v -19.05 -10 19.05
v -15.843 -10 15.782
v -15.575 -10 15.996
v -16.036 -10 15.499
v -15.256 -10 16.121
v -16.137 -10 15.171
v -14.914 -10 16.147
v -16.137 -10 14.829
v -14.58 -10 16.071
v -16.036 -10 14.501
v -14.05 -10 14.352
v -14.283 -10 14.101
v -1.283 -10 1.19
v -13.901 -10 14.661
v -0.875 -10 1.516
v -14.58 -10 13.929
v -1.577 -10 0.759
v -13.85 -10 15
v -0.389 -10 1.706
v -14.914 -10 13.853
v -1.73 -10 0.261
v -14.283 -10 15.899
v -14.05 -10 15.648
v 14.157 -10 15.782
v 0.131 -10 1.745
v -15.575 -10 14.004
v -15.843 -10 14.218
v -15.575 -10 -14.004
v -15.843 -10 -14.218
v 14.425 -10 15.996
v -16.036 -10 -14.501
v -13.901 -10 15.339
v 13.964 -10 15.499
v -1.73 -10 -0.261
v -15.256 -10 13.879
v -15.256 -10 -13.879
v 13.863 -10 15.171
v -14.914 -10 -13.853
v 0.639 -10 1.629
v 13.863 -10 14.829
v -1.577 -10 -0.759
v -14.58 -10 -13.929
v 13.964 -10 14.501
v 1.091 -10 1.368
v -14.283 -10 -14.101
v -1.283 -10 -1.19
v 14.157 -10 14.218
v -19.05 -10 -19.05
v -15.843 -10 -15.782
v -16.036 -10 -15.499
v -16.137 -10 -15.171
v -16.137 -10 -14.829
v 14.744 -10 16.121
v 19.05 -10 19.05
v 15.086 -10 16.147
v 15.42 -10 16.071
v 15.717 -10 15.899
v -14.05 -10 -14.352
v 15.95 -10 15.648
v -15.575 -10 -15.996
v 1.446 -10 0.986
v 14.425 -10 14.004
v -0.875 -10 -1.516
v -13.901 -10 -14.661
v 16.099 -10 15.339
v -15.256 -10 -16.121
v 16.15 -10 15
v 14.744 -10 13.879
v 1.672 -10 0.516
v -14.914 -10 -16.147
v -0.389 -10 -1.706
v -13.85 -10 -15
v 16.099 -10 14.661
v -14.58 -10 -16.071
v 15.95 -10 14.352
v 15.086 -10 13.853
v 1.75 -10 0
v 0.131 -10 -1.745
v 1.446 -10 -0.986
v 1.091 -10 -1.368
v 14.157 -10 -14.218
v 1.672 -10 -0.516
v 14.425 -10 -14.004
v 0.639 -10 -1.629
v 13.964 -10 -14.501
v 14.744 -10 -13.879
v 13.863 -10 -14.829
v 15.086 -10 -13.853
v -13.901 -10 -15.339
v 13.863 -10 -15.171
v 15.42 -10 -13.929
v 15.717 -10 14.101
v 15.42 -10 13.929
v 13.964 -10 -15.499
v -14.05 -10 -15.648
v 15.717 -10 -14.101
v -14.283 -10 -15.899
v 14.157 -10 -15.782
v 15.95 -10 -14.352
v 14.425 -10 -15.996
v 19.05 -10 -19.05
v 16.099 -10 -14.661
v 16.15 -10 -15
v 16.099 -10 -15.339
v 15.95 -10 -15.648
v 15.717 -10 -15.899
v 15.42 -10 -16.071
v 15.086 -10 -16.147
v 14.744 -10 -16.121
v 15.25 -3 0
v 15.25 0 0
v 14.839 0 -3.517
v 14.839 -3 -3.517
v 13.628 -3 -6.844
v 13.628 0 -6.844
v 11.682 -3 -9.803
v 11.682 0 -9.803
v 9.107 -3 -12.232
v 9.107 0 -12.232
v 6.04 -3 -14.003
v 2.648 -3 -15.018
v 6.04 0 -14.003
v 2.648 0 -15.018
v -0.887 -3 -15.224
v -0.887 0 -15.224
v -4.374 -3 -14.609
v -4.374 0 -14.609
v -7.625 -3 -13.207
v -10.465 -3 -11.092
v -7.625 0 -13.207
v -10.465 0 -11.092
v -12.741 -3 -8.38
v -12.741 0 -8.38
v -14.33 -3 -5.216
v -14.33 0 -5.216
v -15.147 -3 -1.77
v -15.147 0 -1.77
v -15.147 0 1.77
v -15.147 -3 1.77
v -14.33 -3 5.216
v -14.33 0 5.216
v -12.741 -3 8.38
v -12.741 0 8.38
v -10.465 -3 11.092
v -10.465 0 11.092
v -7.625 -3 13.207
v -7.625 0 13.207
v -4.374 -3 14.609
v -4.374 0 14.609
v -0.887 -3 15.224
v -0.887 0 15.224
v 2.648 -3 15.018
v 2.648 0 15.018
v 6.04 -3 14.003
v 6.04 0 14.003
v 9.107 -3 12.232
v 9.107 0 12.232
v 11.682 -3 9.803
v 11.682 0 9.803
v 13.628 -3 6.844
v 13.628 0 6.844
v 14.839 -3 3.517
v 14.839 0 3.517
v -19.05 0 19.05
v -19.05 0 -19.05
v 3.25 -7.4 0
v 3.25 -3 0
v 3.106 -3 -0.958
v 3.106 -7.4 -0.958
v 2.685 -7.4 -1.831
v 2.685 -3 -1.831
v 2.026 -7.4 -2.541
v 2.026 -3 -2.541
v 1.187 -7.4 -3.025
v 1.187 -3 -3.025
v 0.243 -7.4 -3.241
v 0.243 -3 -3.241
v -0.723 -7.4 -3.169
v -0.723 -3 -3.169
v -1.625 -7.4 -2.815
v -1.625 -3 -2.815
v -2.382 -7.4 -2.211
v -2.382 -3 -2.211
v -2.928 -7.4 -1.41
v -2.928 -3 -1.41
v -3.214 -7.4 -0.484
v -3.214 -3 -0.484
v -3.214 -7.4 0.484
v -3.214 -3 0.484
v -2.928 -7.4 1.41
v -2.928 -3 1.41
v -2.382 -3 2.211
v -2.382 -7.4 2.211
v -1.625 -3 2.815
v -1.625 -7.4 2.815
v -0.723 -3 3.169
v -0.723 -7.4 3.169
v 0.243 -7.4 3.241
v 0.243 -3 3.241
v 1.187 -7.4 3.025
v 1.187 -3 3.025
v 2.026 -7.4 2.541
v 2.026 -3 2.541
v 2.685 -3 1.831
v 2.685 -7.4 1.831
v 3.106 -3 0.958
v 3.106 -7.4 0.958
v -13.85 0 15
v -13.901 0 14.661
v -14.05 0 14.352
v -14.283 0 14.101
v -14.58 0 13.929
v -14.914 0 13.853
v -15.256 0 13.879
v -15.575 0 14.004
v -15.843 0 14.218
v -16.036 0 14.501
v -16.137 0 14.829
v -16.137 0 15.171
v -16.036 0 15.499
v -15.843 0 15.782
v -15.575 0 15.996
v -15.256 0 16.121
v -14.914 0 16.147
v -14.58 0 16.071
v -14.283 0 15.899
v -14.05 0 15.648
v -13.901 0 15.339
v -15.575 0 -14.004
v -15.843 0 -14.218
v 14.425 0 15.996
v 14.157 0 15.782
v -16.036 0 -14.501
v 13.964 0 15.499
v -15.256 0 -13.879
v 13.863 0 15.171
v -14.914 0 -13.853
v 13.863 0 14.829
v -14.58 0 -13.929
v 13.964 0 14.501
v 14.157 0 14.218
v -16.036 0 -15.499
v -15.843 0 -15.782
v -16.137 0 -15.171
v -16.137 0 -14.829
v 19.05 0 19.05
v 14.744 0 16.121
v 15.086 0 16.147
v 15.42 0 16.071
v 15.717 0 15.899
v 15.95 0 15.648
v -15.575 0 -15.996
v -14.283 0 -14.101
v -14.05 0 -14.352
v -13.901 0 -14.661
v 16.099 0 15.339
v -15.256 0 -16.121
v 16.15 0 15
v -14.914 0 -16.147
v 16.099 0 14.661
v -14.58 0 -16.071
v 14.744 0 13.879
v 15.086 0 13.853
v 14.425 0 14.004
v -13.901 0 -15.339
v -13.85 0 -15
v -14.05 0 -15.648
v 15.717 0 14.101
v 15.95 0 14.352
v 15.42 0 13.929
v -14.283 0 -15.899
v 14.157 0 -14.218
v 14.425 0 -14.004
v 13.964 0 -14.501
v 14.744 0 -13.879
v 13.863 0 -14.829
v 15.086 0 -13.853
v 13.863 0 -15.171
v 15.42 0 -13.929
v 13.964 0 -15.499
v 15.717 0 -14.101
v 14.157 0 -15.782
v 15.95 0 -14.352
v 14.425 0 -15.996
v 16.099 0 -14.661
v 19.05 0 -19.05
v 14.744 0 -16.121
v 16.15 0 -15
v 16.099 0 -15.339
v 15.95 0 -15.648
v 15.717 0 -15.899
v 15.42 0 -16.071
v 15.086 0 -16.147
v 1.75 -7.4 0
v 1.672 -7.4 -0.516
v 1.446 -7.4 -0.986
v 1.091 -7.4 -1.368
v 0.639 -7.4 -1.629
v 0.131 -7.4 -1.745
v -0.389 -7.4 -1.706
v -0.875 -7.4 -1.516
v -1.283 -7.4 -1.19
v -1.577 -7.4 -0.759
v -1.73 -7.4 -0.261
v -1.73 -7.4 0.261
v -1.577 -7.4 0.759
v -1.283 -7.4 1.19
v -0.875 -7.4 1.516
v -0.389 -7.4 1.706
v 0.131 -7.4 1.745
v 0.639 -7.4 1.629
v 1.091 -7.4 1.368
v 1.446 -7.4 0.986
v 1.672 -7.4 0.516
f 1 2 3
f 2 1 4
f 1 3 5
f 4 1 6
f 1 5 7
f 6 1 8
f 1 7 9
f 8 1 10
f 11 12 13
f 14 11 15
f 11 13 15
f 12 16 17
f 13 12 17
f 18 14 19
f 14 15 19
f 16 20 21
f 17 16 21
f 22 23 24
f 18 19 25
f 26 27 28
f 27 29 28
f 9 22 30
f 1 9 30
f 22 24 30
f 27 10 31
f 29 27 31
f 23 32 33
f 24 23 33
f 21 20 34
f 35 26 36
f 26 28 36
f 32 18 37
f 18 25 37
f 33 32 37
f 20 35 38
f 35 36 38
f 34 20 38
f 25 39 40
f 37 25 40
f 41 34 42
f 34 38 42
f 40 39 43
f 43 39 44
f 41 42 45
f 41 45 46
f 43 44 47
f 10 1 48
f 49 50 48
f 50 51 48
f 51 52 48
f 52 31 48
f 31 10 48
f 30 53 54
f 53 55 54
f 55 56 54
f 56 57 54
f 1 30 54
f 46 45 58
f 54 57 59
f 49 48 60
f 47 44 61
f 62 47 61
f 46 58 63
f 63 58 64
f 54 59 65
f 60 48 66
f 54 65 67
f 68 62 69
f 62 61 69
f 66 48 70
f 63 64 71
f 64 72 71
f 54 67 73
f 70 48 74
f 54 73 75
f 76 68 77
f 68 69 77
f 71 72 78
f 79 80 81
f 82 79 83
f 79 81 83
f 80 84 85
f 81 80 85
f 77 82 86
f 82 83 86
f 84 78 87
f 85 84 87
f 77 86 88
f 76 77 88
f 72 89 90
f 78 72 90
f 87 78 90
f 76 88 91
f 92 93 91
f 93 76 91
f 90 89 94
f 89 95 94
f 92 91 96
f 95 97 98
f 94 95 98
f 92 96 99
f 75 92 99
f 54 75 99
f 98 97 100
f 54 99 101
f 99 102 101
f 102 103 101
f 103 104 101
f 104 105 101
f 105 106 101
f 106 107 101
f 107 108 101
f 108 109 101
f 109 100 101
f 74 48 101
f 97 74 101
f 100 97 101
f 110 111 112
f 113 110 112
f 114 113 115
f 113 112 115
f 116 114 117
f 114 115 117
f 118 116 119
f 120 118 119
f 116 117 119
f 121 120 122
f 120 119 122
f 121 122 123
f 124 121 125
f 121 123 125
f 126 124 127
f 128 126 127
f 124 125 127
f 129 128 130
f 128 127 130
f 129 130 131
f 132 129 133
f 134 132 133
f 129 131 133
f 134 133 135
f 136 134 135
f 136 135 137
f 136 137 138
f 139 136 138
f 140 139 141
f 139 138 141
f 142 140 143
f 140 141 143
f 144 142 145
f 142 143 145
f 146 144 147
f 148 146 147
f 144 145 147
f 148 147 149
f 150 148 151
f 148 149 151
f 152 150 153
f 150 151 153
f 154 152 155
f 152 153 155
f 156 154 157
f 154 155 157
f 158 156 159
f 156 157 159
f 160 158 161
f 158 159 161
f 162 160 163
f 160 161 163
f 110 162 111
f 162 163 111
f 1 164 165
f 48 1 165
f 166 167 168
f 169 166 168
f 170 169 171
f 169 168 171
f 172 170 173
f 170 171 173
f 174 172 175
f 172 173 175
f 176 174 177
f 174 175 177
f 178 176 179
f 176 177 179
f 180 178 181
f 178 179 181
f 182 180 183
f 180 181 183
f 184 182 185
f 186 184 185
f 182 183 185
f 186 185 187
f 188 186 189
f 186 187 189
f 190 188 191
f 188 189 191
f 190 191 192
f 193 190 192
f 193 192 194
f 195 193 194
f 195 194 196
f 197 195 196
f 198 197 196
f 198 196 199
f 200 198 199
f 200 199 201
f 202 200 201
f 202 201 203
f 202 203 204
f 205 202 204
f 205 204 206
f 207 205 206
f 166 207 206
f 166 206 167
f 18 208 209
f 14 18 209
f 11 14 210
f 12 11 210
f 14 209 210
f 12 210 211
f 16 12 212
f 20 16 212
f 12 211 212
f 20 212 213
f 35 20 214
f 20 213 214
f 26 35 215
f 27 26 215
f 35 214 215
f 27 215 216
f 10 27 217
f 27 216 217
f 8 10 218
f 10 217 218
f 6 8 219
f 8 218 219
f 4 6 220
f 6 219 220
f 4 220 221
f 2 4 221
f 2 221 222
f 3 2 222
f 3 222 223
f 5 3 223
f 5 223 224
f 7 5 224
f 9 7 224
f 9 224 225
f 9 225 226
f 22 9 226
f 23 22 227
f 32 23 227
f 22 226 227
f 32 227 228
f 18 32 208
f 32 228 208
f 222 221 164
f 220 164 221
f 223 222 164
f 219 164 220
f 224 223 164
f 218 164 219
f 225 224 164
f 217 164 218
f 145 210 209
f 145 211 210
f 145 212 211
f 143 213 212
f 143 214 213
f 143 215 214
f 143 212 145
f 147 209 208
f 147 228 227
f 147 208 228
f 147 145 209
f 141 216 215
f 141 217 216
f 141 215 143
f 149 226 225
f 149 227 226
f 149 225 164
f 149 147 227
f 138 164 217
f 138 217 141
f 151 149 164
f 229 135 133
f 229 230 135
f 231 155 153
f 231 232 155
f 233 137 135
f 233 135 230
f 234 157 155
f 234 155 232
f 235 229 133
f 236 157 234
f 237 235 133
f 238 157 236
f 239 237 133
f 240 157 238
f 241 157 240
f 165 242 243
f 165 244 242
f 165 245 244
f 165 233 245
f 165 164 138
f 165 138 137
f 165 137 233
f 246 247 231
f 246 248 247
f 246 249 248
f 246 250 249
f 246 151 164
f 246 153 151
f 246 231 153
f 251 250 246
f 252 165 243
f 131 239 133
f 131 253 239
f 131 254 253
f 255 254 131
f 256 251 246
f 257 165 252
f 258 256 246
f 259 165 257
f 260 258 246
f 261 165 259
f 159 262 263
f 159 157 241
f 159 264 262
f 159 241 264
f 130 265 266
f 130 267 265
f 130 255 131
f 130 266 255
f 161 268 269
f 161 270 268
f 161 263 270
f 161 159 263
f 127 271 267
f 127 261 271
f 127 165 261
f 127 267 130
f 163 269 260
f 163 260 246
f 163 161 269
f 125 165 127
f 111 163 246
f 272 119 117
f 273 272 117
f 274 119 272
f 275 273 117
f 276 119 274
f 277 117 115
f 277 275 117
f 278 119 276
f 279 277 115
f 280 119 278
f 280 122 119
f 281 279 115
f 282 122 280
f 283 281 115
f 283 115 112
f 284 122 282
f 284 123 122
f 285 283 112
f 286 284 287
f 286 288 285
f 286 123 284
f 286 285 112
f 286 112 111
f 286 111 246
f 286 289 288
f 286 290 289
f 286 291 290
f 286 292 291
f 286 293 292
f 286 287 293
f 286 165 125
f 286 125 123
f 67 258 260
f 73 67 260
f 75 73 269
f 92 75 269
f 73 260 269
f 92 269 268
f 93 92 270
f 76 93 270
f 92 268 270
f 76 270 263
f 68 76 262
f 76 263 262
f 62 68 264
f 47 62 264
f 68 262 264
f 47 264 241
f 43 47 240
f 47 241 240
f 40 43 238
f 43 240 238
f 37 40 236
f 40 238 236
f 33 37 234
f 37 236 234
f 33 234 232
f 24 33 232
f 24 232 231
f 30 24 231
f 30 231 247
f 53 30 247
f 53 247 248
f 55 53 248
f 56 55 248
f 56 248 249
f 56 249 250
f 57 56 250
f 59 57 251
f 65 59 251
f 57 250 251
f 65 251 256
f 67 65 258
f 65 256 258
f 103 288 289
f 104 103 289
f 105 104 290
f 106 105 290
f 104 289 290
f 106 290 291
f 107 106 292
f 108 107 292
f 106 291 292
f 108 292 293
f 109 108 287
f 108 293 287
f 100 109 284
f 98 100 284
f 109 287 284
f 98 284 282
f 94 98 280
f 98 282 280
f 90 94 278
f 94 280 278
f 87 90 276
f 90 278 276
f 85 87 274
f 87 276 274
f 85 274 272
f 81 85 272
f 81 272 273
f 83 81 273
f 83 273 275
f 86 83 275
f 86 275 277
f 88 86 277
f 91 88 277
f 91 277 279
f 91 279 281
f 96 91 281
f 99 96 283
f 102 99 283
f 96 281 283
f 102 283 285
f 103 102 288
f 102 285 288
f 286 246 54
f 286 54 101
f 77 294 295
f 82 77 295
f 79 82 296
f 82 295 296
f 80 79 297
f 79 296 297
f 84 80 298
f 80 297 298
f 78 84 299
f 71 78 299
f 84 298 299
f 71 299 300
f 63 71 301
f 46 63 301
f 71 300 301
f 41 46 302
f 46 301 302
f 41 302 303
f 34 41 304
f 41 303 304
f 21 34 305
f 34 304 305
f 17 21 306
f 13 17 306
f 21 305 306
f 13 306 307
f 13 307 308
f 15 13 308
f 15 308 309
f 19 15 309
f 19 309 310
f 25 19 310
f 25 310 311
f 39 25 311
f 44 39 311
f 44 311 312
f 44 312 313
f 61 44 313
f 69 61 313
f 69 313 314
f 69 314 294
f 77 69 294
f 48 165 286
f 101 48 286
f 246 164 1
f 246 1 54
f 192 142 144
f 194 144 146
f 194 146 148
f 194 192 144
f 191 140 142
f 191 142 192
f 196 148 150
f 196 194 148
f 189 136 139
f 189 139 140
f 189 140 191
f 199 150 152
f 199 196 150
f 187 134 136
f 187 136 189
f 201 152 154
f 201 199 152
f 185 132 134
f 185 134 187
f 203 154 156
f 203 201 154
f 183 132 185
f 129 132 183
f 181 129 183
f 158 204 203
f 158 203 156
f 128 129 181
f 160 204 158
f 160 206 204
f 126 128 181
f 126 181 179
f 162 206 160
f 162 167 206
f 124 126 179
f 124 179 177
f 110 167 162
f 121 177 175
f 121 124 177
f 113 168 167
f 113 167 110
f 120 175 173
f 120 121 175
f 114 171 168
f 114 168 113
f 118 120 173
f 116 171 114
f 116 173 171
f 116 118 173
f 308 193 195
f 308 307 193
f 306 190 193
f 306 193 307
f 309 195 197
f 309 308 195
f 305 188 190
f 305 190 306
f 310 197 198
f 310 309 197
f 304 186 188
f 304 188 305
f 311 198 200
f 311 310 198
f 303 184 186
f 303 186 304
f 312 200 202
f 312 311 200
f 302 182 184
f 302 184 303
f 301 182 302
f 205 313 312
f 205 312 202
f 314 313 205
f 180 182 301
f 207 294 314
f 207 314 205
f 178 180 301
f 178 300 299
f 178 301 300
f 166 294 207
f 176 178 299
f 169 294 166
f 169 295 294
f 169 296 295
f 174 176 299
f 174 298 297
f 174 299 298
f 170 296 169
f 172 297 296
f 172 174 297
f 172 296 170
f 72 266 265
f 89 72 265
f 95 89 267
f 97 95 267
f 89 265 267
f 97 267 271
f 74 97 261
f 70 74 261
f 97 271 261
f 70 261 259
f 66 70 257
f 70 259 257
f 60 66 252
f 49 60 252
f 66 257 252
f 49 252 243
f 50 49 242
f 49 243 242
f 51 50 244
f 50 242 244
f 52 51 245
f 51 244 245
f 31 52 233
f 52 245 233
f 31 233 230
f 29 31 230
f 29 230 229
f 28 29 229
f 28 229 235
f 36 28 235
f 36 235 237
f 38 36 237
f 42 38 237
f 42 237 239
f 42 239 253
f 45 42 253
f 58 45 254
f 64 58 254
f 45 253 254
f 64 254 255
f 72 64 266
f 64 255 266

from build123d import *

# Parameters (mm, degrees)
SKETCH1_W           = 38.1
SKETCH1_H           = 38.1
BOSS_EXTRUDE1_DEPTH = 10
SKETCH1_3_R         = 1.15
CUT_EXTRUDE1_DEPTH  = 10
SKETCH1_4_R         = 1.15
CUT_EXTRUDE2_DEPTH  = 10
SKETCH1_5_R         = 1.15
CUT_EXTRUDE3_DEPTH  = 10
SKETCH1_6_R         = 1.15
CUT_EXTRUDE4_DEPTH  = 10
SKETCH1_7_R         = 15.25
SKETCH1_7_R_2       = 3.25
CUT_EXTRUDE5_DEPTH  = 3
SKETCH1_8_R         = 3.25
SKETCH1_8_R_2       = 1.75
CUT_EXTRUDE6_DEPTH  = 7.4
SKETCH1_9_R         = 1.75
CUT_EXTRUDE7_DEPTH  = 10


with BuildPart() as part:
    # Sketch1 → Boss-Extrude1 (new body)
    with BuildSketch(Plane(origin=(0, 0, 0), x_dir=(1, 0, 0), z_dir=(0, 1, 0))):
        Rectangle(SKETCH1_W, SKETCH1_H)
    extrude(amount=-BOSS_EXTRUDE1_DEPTH)

    # Sketch1<3> → Cut-Extrude1 (cut)
    with BuildSketch(Plane(origin=(0, 0, 0), x_dir=(1, 0, 0), z_dir=(0, 1, 0))):
        with Locations((-15, 15)):
            Circle(SKETCH1_3_R)
    extrude(amount=-CUT_EXTRUDE1_DEPTH, mode=Mode.SUBTRACT)

    # Sketch1<4> → Cut-Extrude2 (cut)
    with BuildSketch(Plane(origin=(0, 0, 0), x_dir=(1, 0, 0), z_dir=(0, 1, 0))):
        with Locations((15, 15)):
            Circle(SKETCH1_4_R)
    extrude(amount=-CUT_EXTRUDE2_DEPTH, mode=Mode.SUBTRACT)

    # Sketch1<5> → Cut-Extrude3 (cut)
    with BuildSketch(Plane(origin=(0, 0, 0), x_dir=(1, 0, 0), z_dir=(0, 1, 0))):
        with Locations((-15, -15)):
            Circle(SKETCH1_5_R)
    extrude(amount=-CUT_EXTRUDE3_DEPTH, mode=Mode.SUBTRACT)

    # Sketch1<6> → Cut-Extrude4 (cut)
    with BuildSketch(Plane(origin=(0, 0, 0), x_dir=(1, 0, 0), z_dir=(0, 1, 0))):
        with Locations((15, -15)):
            Circle(SKETCH1_6_R)
    extrude(amount=-CUT_EXTRUDE4_DEPTH, mode=Mode.SUBTRACT)

    # Sketch1<7> → Cut-Extrude5 (cut)
    with BuildSketch(Plane(origin=(0, 0, 0), x_dir=(1, 0, 0), z_dir=(0, 1, 0))):
        Circle(SKETCH1_7_R)
        Circle(SKETCH1_7_R_2, mode=Mode.SUBTRACT)
    extrude(amount=-CUT_EXTRUDE5_DEPTH, mode=Mode.SUBTRACT)

    # Sketch1<8> → Cut-Extrude6 (cut)
    with BuildSketch(Plane(origin=(0, 0, 0), x_dir=(1, 0, 0), z_dir=(0, 1, 0))):
        Circle(SKETCH1_8_R)
        Circle(SKETCH1_8_R_2, mode=Mode.SUBTRACT)
    extrude(amount=-CUT_EXTRUDE6_DEPTH, mode=Mode.SUBTRACT)

    # Sketch1<9> → Cut-Extrude7 (cut)
    with BuildSketch(Plane(origin=(0, 0, 0), x_dir=(1, 0, 0), z_dir=(0, 1, 0))):
        Circle(SKETCH1_9_R)
    extrude(amount=-CUT_EXTRUDE7_DEPTH, mode=Mode.SUBTRACT)


solid = part.part
